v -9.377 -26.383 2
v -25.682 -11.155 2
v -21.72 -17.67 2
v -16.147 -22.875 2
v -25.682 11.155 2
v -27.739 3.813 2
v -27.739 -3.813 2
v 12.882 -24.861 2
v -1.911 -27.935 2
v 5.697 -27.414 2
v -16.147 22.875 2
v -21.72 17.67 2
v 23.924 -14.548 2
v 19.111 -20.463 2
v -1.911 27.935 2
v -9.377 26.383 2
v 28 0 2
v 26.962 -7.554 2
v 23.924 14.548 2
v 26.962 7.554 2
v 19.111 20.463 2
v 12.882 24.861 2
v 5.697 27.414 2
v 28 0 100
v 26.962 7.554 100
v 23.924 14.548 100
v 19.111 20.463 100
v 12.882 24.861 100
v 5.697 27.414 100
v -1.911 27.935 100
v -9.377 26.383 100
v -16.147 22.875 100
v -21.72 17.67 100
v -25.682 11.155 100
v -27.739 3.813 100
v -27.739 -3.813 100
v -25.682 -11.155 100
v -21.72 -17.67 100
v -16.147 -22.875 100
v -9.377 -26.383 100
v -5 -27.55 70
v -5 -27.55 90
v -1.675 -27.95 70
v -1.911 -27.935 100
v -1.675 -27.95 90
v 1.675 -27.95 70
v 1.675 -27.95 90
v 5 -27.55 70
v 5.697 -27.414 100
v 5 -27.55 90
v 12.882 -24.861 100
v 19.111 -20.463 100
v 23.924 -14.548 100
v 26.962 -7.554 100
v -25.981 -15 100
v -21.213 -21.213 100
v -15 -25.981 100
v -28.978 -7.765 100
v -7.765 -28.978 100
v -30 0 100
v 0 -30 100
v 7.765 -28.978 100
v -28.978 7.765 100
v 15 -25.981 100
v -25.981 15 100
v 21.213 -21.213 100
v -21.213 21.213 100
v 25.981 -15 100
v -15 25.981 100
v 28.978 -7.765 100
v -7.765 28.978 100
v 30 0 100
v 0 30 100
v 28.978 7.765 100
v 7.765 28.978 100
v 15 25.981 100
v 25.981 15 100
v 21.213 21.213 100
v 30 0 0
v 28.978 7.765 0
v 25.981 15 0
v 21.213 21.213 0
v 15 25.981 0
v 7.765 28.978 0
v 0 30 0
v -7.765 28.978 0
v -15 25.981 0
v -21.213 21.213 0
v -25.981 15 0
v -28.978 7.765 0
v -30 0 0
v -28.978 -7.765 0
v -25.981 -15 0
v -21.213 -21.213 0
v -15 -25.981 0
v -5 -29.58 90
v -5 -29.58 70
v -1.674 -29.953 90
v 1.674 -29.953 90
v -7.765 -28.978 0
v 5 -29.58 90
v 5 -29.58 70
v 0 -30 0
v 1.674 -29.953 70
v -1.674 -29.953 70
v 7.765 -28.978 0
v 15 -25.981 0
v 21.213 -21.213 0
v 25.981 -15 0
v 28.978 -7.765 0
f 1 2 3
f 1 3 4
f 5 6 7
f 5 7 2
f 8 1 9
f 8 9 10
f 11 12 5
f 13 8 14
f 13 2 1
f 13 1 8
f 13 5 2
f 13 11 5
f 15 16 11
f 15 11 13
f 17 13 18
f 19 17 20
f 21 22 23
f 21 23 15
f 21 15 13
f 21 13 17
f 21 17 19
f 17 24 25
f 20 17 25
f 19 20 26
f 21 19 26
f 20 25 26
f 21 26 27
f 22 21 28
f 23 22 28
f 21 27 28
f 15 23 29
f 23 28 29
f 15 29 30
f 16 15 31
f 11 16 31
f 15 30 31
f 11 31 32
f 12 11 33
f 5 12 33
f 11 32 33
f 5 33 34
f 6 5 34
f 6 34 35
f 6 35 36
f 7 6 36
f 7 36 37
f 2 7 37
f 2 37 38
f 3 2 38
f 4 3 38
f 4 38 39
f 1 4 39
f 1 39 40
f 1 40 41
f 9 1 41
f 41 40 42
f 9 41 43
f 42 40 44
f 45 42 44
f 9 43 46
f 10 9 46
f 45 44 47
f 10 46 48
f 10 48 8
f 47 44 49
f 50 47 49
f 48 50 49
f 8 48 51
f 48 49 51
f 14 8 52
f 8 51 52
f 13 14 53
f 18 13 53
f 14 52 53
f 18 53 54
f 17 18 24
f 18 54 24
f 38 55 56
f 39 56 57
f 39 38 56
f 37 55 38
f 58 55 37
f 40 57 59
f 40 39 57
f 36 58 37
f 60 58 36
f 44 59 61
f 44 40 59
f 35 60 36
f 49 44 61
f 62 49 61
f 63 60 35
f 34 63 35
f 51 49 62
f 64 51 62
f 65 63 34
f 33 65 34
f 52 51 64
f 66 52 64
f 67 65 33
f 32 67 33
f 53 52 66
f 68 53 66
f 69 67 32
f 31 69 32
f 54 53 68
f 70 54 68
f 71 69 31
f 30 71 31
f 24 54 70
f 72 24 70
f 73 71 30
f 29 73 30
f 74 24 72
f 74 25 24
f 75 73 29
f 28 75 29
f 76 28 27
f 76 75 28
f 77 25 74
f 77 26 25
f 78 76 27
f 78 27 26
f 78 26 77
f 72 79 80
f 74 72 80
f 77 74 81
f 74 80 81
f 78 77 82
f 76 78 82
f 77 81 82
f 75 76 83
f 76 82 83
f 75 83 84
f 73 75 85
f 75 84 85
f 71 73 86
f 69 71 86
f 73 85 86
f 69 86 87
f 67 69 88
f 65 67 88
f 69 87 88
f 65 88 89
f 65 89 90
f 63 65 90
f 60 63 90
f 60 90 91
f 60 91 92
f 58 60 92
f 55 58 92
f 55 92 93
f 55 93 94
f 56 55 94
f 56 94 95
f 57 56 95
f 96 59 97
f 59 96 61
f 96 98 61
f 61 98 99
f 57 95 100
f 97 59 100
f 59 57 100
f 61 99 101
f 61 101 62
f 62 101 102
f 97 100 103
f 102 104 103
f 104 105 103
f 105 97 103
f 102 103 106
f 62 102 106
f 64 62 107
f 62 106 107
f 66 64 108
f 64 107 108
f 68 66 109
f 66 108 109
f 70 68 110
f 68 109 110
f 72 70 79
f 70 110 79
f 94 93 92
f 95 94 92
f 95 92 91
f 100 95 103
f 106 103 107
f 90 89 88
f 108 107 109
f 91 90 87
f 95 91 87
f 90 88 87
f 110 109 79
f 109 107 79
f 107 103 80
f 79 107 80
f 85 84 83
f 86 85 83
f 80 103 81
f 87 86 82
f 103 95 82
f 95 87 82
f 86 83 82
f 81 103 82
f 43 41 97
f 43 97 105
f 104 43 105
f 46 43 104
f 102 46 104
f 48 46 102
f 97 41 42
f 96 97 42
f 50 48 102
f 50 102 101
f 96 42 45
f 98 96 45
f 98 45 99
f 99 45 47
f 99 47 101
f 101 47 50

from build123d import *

# Parameters (mm, degrees)
F0_R     = 30
F1_DEPTH = 100
F2_R     = 28
F3_DEPTH = 98
F4_W     = 10
F4_H     = 20
F5_DEPTH = 30


with BuildPart() as f1:
    # F0 (on Top) → F1 (new body)
    with BuildSketch(Plane.XY):
        Circle(F0_R)
    extrude(amount=F1_DEPTH)

    # F2 (on face) → F3 (cut)
    with BuildSketch(Plane.XY.offset(100)):
        Circle(F2_R)
    extrude(amount=-F3_DEPTH, mode=Mode.SUBTRACT)

    # F4 (on Front) → F5 (cut)
    with BuildSketch(Plane.XZ):
        with Locations((0, 80)):
            Rectangle(F4_W, F4_H)
    extrude(amount=F5_DEPTH, mode=Mode.SUBTRACT)


solid = f1.part
